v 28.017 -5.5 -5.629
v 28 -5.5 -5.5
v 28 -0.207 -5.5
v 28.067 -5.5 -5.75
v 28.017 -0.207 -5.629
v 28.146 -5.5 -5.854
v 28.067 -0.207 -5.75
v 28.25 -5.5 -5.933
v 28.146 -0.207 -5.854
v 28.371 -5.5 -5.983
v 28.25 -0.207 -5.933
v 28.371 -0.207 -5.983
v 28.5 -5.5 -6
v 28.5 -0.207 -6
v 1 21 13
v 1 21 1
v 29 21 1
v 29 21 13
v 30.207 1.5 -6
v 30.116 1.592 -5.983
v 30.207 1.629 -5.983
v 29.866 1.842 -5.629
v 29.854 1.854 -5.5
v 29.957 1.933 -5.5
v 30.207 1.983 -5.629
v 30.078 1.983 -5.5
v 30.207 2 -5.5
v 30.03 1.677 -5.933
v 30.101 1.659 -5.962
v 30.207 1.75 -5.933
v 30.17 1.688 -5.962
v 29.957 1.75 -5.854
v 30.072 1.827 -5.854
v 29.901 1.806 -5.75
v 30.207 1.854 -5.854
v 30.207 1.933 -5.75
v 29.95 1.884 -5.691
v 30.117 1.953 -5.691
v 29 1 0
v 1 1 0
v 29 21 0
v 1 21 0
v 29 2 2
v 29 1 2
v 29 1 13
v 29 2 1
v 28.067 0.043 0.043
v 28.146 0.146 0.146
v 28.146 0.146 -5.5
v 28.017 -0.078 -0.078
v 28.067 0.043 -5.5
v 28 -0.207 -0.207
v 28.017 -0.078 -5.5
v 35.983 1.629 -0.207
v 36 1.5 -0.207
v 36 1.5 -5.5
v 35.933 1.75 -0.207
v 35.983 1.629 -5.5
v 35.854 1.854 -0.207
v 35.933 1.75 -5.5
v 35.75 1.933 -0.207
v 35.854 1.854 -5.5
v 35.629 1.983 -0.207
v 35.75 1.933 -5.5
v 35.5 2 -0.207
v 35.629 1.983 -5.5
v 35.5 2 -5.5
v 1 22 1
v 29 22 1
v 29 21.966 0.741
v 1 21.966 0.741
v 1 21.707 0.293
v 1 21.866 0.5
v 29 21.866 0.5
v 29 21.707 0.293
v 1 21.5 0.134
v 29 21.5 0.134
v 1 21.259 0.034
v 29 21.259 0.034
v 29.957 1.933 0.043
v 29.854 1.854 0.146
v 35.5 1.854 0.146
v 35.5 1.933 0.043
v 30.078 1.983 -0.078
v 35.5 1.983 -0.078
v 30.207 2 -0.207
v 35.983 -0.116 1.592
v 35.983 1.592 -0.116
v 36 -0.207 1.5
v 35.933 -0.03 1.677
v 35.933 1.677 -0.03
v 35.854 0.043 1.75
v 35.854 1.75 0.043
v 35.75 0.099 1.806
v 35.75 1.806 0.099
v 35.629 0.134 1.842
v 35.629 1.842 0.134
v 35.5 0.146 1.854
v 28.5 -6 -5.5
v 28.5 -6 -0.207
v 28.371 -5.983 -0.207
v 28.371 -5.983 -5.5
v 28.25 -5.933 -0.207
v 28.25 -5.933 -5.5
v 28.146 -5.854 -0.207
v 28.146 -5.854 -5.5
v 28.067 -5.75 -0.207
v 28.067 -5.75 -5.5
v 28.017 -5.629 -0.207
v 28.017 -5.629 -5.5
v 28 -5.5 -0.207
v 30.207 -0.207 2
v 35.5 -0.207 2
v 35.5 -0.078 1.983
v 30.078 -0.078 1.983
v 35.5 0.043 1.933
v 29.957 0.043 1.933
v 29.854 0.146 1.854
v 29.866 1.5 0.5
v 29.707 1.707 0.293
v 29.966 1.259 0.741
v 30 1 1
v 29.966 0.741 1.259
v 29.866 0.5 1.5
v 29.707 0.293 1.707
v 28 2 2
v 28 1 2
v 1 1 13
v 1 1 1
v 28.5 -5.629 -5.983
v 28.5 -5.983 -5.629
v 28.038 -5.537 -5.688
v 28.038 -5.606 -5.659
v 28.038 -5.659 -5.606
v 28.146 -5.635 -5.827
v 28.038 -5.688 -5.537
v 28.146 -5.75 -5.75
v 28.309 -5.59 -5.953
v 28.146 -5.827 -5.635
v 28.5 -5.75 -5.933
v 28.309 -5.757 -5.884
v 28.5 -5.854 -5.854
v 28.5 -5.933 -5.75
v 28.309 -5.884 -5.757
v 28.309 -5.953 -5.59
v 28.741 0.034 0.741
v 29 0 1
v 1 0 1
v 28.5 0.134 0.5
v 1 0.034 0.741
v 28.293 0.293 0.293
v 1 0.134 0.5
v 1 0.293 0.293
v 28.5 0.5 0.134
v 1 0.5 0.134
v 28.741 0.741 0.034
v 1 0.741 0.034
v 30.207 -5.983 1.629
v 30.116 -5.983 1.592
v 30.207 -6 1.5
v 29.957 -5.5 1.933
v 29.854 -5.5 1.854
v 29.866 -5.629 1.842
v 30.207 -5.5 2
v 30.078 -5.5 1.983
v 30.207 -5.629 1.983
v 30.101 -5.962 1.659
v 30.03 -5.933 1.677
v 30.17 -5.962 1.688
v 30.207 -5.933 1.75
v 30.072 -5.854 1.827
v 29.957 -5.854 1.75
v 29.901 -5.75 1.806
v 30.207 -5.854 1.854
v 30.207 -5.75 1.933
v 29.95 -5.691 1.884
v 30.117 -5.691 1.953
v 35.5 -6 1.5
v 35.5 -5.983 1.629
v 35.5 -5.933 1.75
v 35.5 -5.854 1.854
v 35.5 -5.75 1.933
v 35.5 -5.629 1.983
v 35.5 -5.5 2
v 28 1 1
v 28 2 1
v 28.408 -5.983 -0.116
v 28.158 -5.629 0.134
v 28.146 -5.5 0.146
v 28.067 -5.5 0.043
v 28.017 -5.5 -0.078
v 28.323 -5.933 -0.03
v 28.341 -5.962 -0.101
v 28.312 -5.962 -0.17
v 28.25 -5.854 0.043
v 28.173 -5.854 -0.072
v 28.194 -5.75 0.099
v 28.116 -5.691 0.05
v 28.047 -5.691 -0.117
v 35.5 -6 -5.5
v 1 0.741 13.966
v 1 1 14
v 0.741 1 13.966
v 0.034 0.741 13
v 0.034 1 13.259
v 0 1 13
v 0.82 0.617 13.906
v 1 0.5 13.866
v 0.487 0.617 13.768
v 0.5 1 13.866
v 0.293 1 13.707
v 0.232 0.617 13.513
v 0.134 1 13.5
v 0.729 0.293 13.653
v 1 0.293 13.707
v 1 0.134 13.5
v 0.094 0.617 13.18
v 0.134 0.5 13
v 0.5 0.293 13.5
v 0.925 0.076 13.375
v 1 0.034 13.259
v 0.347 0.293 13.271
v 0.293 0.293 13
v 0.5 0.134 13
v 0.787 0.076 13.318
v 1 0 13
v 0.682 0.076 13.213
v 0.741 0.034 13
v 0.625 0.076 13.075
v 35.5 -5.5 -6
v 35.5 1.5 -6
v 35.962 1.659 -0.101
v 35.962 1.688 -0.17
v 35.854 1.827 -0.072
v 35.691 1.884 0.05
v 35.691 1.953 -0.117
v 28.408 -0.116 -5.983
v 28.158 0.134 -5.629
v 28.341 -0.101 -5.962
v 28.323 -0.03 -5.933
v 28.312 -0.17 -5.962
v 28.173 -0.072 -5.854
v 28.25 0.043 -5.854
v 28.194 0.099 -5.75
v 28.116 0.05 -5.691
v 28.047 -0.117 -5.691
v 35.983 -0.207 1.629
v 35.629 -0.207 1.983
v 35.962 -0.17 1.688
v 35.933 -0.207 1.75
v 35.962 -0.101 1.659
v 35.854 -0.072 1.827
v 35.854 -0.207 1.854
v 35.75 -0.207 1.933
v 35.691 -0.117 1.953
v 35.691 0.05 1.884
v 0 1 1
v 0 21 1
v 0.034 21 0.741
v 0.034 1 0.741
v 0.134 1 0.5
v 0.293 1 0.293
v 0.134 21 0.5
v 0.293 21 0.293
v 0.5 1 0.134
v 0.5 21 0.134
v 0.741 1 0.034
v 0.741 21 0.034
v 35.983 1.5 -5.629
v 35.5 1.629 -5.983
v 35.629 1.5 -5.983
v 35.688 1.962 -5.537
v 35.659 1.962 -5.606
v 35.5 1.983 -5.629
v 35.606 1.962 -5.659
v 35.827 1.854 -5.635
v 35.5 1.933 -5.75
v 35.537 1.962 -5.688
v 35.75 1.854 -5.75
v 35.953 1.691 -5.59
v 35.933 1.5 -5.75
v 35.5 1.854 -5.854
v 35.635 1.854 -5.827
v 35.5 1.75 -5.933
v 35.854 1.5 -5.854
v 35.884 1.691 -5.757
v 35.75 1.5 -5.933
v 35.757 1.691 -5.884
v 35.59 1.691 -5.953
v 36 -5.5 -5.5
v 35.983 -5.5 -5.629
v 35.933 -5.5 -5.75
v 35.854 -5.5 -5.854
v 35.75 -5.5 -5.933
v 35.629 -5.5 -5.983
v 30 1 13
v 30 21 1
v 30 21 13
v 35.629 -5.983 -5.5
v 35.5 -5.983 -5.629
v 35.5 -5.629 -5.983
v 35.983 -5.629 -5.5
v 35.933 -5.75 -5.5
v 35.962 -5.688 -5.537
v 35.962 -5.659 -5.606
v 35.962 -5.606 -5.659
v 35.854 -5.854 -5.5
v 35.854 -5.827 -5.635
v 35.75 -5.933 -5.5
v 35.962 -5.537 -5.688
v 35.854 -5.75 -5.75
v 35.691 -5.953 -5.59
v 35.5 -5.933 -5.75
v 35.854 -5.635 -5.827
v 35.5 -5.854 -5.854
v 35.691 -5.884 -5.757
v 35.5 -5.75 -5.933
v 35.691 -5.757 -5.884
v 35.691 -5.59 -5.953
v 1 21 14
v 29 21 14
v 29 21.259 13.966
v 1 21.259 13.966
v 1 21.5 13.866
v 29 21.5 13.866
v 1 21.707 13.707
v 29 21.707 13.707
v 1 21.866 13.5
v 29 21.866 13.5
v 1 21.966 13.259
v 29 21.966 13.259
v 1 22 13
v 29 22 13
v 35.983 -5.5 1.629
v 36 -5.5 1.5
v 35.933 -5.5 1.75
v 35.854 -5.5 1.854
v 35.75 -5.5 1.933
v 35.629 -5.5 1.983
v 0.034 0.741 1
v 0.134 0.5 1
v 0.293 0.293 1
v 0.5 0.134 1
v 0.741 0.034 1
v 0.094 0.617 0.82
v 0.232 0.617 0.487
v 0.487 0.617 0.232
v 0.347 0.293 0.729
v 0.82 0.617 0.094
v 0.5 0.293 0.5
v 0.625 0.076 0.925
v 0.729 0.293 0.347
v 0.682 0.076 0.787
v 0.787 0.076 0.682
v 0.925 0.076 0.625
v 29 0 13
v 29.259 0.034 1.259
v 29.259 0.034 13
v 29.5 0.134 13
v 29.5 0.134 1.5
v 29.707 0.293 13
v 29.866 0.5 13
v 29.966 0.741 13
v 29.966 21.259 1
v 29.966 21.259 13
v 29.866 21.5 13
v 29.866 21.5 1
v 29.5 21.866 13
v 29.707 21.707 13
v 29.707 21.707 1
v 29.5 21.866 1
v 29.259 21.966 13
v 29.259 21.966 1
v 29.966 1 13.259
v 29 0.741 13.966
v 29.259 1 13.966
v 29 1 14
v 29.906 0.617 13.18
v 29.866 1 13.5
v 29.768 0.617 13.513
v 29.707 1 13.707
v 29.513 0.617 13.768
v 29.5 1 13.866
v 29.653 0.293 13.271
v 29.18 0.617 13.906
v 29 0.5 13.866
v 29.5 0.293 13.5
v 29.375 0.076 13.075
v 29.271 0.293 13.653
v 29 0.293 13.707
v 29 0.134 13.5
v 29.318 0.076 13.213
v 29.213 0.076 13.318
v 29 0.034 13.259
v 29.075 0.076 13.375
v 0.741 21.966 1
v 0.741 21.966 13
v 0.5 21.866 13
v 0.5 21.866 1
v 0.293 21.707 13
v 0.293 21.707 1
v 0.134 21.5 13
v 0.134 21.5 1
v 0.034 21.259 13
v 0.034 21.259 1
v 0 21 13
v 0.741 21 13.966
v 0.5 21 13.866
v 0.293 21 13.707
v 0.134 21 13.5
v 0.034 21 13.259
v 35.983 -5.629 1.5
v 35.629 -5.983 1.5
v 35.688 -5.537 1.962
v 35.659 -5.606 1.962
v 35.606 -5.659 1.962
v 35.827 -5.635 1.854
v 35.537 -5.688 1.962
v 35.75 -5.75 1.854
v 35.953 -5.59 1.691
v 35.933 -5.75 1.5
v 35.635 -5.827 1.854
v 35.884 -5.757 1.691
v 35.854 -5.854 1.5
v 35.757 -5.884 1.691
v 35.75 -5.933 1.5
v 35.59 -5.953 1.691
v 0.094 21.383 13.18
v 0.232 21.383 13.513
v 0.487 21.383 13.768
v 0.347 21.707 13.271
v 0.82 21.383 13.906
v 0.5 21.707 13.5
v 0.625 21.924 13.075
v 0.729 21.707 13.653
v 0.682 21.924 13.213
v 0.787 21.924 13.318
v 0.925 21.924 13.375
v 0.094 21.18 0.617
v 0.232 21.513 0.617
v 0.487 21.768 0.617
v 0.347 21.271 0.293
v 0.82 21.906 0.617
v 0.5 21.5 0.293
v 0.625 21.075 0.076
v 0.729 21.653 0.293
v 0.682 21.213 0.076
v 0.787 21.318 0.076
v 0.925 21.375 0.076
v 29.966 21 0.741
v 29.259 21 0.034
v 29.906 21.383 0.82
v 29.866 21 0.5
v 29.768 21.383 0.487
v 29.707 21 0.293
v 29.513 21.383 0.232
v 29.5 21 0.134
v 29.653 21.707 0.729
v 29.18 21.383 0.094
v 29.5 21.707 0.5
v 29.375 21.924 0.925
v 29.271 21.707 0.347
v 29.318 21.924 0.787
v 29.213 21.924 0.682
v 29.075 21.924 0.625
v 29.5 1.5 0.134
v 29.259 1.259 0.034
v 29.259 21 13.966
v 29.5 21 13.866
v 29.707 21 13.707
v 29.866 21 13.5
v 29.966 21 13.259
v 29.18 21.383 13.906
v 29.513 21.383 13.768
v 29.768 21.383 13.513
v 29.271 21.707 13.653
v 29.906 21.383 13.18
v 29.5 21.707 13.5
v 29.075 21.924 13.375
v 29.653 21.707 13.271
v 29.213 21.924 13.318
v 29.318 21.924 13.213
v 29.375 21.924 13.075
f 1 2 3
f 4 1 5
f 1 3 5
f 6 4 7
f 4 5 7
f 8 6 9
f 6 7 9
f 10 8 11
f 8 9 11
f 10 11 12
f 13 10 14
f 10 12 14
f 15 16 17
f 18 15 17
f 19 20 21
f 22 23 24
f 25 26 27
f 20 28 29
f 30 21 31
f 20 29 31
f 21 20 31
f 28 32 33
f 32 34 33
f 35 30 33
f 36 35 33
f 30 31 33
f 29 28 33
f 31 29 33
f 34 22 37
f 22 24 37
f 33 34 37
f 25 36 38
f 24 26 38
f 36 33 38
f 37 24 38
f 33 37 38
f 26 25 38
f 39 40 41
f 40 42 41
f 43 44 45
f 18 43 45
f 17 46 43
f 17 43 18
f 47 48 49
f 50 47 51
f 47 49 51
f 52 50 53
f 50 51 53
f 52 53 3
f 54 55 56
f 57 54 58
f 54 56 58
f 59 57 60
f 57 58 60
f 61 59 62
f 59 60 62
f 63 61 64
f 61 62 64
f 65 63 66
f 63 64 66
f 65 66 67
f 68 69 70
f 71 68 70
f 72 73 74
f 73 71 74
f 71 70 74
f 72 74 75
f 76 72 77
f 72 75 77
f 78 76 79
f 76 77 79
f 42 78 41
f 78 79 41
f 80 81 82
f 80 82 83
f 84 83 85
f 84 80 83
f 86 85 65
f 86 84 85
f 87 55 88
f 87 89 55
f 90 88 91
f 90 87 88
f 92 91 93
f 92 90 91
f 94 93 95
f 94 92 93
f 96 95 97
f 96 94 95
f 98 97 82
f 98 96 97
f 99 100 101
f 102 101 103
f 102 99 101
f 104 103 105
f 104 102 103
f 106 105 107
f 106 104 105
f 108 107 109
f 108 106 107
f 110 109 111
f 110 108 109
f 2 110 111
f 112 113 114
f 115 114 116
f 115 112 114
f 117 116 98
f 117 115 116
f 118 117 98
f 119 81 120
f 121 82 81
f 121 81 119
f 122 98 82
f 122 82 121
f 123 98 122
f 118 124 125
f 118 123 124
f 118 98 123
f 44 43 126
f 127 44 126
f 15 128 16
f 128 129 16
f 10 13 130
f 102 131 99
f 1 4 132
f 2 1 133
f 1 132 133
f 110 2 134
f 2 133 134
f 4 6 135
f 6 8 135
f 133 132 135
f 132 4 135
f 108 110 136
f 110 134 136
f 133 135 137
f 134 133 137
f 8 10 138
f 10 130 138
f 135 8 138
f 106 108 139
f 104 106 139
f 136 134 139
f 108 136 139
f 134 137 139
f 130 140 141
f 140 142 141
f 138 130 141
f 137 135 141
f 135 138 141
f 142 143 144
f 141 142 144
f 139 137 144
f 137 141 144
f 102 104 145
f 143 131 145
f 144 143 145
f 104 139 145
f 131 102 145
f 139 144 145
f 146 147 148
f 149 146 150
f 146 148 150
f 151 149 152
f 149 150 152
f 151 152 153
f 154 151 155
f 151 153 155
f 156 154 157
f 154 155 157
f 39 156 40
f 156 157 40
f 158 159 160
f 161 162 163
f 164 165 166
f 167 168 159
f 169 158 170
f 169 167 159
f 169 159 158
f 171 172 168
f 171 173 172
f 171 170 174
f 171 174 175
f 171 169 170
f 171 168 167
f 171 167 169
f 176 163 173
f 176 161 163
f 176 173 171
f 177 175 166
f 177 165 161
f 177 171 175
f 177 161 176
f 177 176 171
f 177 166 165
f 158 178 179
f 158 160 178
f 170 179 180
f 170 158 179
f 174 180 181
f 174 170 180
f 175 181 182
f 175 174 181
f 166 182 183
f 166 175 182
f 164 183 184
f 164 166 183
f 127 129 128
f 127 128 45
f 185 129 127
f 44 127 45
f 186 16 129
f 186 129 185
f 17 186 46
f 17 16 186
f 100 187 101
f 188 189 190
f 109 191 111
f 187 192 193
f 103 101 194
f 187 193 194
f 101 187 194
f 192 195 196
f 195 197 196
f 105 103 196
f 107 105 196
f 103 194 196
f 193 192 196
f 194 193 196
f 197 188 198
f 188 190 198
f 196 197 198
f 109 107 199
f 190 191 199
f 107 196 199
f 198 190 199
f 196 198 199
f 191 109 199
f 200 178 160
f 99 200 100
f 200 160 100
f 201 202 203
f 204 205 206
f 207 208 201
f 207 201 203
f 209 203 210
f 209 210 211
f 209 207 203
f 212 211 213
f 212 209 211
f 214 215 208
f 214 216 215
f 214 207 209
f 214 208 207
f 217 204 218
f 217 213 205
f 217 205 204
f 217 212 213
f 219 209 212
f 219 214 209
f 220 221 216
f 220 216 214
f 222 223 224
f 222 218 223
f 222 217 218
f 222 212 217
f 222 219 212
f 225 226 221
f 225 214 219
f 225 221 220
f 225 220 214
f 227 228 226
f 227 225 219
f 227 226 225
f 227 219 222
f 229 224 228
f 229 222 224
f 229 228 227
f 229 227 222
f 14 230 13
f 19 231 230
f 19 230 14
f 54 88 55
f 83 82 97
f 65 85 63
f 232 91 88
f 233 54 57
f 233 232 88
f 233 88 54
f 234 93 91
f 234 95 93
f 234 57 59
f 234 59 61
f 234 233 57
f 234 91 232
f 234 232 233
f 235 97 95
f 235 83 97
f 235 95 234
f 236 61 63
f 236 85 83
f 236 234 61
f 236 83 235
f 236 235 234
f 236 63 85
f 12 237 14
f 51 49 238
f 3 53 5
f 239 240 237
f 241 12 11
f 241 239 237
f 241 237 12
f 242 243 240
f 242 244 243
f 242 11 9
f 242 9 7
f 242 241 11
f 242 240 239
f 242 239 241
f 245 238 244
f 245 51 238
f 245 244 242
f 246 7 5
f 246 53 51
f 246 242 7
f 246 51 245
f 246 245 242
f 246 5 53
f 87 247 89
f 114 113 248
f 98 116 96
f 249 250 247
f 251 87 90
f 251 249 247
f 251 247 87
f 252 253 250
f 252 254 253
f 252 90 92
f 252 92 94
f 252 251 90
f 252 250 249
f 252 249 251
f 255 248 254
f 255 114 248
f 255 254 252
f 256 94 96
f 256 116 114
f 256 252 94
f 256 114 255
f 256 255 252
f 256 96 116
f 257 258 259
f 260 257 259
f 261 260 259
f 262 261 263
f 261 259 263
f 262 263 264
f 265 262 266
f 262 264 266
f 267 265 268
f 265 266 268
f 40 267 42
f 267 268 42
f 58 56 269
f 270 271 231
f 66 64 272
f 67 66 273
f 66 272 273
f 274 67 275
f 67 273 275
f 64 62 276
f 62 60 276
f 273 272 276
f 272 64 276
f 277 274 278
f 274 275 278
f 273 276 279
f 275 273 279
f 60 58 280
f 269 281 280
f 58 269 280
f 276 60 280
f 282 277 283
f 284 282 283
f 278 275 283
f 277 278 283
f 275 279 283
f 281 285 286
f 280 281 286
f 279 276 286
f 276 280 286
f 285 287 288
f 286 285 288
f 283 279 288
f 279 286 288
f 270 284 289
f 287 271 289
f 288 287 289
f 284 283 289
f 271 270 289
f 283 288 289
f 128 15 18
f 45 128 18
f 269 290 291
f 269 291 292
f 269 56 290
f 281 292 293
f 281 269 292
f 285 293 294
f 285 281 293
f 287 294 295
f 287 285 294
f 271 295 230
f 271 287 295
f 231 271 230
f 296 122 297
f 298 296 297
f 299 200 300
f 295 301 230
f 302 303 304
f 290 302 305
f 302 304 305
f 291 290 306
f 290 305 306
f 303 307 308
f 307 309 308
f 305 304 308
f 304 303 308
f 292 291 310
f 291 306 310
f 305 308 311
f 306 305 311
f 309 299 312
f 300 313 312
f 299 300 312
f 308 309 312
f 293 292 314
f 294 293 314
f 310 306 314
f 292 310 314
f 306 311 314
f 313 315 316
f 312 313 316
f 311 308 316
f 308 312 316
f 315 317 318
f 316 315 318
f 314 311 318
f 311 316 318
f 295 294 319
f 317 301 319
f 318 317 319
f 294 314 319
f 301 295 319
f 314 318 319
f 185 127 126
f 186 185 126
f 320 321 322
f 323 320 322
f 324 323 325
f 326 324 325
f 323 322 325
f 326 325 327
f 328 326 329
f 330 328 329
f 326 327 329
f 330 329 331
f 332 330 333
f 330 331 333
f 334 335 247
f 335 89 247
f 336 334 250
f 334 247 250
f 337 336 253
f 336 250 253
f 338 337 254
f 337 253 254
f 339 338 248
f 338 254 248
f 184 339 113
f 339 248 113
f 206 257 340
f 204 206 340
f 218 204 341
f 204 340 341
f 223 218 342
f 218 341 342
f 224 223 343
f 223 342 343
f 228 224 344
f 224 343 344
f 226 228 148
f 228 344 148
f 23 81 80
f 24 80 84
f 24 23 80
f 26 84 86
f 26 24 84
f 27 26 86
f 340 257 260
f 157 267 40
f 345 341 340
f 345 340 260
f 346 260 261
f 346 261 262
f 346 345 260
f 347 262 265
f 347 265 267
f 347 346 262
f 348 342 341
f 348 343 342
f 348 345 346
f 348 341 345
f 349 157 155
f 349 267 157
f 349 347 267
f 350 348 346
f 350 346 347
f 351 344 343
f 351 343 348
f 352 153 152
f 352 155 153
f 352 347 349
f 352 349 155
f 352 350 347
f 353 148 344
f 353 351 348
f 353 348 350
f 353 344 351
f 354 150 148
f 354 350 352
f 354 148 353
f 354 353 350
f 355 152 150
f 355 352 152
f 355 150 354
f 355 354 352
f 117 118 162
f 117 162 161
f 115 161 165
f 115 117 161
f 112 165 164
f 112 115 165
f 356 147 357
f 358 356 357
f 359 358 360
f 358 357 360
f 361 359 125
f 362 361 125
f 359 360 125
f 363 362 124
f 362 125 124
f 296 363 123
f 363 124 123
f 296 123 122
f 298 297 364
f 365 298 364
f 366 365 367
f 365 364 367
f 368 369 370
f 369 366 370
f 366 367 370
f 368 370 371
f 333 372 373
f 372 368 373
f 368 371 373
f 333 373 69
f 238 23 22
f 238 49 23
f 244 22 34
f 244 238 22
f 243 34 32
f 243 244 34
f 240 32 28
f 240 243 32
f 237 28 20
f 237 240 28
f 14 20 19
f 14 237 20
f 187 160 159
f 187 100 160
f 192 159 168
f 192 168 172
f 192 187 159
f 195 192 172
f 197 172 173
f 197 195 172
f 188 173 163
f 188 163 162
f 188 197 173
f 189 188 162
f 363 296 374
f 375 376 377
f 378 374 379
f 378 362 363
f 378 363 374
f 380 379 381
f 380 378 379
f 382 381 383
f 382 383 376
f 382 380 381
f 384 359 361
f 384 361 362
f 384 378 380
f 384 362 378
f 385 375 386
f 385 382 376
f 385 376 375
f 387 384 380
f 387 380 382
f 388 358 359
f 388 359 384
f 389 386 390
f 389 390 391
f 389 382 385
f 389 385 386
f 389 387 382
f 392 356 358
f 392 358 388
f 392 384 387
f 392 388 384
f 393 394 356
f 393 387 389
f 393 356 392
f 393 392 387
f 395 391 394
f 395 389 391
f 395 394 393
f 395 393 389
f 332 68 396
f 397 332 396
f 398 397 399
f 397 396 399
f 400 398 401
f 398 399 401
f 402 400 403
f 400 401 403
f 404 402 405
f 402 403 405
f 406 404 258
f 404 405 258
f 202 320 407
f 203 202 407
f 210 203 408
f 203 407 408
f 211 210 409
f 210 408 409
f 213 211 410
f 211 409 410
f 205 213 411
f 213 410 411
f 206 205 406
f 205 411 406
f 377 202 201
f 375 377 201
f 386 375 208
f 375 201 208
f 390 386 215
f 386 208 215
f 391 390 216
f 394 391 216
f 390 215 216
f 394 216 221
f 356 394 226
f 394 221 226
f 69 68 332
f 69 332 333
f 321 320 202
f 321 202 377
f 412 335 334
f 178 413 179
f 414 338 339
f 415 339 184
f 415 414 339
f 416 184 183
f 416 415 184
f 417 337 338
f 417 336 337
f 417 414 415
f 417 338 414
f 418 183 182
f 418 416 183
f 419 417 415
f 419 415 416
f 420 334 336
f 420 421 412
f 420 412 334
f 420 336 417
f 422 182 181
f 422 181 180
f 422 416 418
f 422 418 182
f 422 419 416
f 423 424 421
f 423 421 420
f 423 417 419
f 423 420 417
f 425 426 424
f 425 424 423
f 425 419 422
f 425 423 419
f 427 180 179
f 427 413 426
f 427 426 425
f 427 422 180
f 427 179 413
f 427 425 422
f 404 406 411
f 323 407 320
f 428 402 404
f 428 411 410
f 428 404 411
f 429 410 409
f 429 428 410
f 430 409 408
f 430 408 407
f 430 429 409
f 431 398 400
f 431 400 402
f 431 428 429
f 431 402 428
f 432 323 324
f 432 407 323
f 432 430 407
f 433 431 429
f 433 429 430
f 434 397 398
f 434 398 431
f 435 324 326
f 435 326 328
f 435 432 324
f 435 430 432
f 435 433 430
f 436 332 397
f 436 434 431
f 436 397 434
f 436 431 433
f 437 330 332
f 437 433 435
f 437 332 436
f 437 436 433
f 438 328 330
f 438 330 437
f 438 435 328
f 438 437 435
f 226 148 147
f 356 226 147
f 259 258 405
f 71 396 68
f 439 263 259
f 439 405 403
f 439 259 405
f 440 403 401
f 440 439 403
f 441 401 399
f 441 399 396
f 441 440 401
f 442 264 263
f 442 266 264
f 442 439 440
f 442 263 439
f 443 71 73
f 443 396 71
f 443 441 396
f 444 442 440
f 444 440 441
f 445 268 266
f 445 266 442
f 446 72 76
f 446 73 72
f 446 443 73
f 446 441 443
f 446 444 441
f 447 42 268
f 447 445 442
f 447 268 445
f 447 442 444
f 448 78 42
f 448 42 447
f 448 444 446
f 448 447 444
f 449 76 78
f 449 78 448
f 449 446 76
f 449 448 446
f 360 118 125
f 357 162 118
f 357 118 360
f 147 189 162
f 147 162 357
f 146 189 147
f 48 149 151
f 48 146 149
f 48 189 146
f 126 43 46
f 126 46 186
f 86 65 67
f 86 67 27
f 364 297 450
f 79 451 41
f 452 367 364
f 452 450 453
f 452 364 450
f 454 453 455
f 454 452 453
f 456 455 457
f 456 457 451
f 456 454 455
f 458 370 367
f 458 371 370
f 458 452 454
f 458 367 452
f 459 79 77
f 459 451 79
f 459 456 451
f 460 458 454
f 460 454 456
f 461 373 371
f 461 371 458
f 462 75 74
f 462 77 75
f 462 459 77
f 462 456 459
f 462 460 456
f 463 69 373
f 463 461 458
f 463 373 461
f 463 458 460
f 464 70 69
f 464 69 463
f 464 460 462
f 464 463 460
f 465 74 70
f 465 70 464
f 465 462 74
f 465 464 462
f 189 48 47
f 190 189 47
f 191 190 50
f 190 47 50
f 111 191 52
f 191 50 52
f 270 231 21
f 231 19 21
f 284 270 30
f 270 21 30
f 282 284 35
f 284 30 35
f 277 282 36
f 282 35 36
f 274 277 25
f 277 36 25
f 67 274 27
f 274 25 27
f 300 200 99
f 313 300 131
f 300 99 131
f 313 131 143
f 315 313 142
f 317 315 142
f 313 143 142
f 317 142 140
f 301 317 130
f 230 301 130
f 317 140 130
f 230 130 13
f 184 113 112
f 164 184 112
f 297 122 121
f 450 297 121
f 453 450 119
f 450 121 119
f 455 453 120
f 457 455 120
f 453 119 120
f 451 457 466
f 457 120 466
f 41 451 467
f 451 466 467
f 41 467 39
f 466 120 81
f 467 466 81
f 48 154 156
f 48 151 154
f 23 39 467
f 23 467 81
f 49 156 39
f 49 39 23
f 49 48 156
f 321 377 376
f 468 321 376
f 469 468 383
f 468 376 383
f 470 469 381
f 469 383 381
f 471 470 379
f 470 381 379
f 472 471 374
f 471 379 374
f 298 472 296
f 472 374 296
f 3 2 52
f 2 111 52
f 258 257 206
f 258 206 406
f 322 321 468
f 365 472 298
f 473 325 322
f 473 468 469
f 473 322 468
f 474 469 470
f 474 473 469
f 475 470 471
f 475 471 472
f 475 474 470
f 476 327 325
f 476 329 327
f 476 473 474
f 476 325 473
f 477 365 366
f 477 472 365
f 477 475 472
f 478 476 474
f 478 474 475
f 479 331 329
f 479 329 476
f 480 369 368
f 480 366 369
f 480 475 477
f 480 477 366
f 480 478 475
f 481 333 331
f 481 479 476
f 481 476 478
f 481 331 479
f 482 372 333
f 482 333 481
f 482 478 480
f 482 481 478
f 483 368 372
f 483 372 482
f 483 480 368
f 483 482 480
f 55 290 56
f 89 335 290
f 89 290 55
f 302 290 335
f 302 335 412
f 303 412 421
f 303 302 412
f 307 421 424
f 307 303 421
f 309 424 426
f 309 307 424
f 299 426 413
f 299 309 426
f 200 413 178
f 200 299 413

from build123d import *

# Parameters (mm, degrees)
SKETCH1_W                = 30
SKETCH1_H                = 22
BOSS_EXTRUDE1_DEPTH      = 14
SHELL1_T                 = 1
BOSS_EXTRUDE3_DEPTH      = 6
BOSS_EXTRUDE3_DEPTH_BACK = 2
SKETCH2_W                = 8
SKETCH2_H                = 8
CHAMFER2_SIZE            = 2
FILLET1_R                = 1
FILLET2_R                = 0.5


with BuildPart() as part:
    # Sketch1 → Boss-Extrude1 (new body)
    with BuildSketch(Plane.XY):
        with Locations((15, 11)):
            Rectangle(SKETCH1_W, SKETCH1_H)
    extrude(amount=BOSS_EXTRUDE1_DEPTH)

    # Shell1 (no face opened: a closed hollow body)
    add(offset(amount=-SHELL1_T, mode=Mode.PRIVATE), mode=Mode.SUBTRACT)

    # Sketch2 → Boss-Extrude3 (add, two sides: drawn at the far end of the back side and taken through both)
    with BuildSketch(Plane(origin=(0, 0, 0), x_dir=(-1, 0, 0), z_dir=(0, 0, -1)).offset(-BOSS_EXTRUDE3_DEPTH_BACK)):
        with Locations((-32, -2)):
            Rectangle(SKETCH2_W, SKETCH2_H)
    extrude(amount=BOSS_EXTRUDE3_DEPTH + BOSS_EXTRUDE3_DEPTH_BACK)

    # Chamfer2
    chamfer2_edges = [part.edges().sort_by_distance(p)[0] for p in [
        (28, -3, 2),
        (28, 2, -3),
        (33, 2, 2),
    ]]
    chamfer(chamfer2_edges, length=CHAMFER2_SIZE)

    # Fillet1
    # the kernel refuses this fillet: 1 mm, written as the material it takes off along each edge
    with BuildSketch(Plane(origin=(1, 21, 1), x_dir=(0, 1, 0), z_dir=(0, 0, -1))) as fillet1_piece_1_section:
        Polygon((0, 0), (FILLET1_R, 0), (FILLET1_R, -FILLET1_R), (0, -FILLET1_R), align=None)
    fillet1_piece_1 = extrude(amount=FILLET1_R, mode=Mode.PRIVATE)
    fillet1_piece_1 = fillet1_piece_1 - Plane(origin=(1, 21, 1), x_dir=(0.7071067811865475, -0.7071067811865477, 0), z_dir=(0, 0, -1)) * Sphere(FILLET1_R, mode=Mode.PRIVATE)
    add(fillet1_piece_1, mode=Mode.SUBTRACT)
    with BuildSketch(Plane(origin=(1, 1, 1), x_dir=(0, 0, -1), z_dir=(0, -1, 0))) as fillet1_piece_2_section:
        Polygon((0, 0), (FILLET1_R, 0), (FILLET1_R, -FILLET1_R), (0, -FILLET1_R), align=None)
    fillet1_piece_2 = extrude(amount=FILLET1_R, mode=Mode.PRIVATE)
    fillet1_piece_2 = fillet1_piece_2 - Plane(origin=(1, 1, 1), x_dir=(0.7071067811865475, 0, 0.7071067811865475), z_dir=(0, -1, 0)) * Sphere(FILLET1_R, mode=Mode.PRIVATE)
    add(fillet1_piece_2, mode=Mode.SUBTRACT)
    with BuildSketch(Plane(origin=(29, 21, 1), x_dir=(0, 0, -1), z_dir=(0, 1, 0))) as fillet1_piece_3_section:
        Polygon((0, 0), (FILLET1_R, 0), (FILLET1_R, -FILLET1_R), (0, -FILLET1_R), align=None)
    fillet1_piece_3 = extrude(amount=FILLET1_R, mode=Mode.PRIVATE)
    fillet1_piece_3 = fillet1_piece_3 - Plane(origin=(29, 21, 1), x_dir=(-0.7071067811865475, 0, 0.7071067811865475), z_dir=(0, 1, 0)) * Sphere(FILLET1_R, mode=Mode.PRIVATE)
    add(fillet1_piece_3, mode=Mode.SUBTRACT)
    with BuildSketch(Plane(origin=(1, 1, 13), x_dir=(-1, 0, 0), z_dir=(0, -1, 0))) as fillet1_piece_4_section:
        Polygon((0, 0), (FILLET1_R, 0), (FILLET1_R, -FILLET1_R), (0, -FILLET1_R), align=None)
    fillet1_piece_4 = extrude(amount=FILLET1_R, mode=Mode.PRIVATE)
    fillet1_piece_4 = fillet1_piece_4 - Plane(origin=(1, 1, 13), x_dir=(0.7071067811865475, 0, -0.7071067811865475), z_dir=(0, -1, 0)) * Sphere(FILLET1_R, mode=Mode.PRIVATE)
    add(fillet1_piece_4, mode=Mode.SUBTRACT)
    with BuildSketch(Plane(origin=(29, 1, 13), x_dir=(1, 0, 0), z_dir=(0, -1, 0))) as fillet1_piece_5_section:
        Polygon((0, 0), (FILLET1_R, 0), (FILLET1_R, FILLET1_R), (0, FILLET1_R), align=None)
    fillet1_piece_5 = extrude(amount=FILLET1_R, mode=Mode.PRIVATE)
    fillet1_piece_5 = fillet1_piece_5 - Plane(origin=(29, 1, 13), x_dir=(-0.7071067811865475, 0, -0.7071067811865475), z_dir=(0, -1, 0)) * Sphere(FILLET1_R, mode=Mode.PRIVATE)
    add(fillet1_piece_5, mode=Mode.SUBTRACT)
    with BuildSketch(Plane(origin=(29, 21, 13), x_dir=(1, 0, 0), z_dir=(0, 1, 0))) as fillet1_piece_6_section:
        Polygon((0, 0), (FILLET1_R, 0), (FILLET1_R, -FILLET1_R), (0, -FILLET1_R), align=None)
    fillet1_piece_6 = extrude(amount=FILLET1_R, mode=Mode.PRIVATE)
    fillet1_piece_6 = fillet1_piece_6 - Plane(origin=(29, 21, 13), x_dir=(-0.7071067811865475, 0, -0.7071067811865475), z_dir=(0, 1, 0)) * Sphere(FILLET1_R, mode=Mode.PRIVATE)
    add(fillet1_piece_6, mode=Mode.SUBTRACT)
    with BuildSketch(Plane(origin=(1, 21, 13), x_dir=(-1, 0, 0), z_dir=(0, 1, 0))) as fillet1_piece_7_section:
        Polygon((0, 0), (FILLET1_R, 0), (FILLET1_R, FILLET1_R), (0, FILLET1_R), align=None)
    fillet1_piece_7 = extrude(amount=FILLET1_R, mode=Mode.PRIVATE)
    fillet1_piece_7 = fillet1_piece_7 - Plane(origin=(1, 21, 13), x_dir=(0.7071067811865475, 0, -0.7071067811865475), z_dir=(0, 1, 0)) * Sphere(FILLET1_R, mode=Mode.PRIVATE)
    add(fillet1_piece_7, mode=Mode.SUBTRACT)
    with BuildSketch(Plane(origin=(0, 21, 0), x_dir=(1, 0, 0), z_dir=(0, -1, 0)), Plane(origin=(30, 1, 14), x_dir=(0, 0, -1), z_dir=(0, 1, 0)), Plane(origin=(0, 21, 14), x_dir=(0, 0, -1), z_dir=(0, -1, 0))) as fillet1_piece_8:
        with BuildLine():
            CenterArc((FILLET1_R, FILLET1_R), FILLET1_R, 180, 90)
            Line((0, FILLET1_R), (0, 0))
            Line((0, 0), (FILLET1_R, 0))
        make_face()
    extrude(amount=20, mode=Mode.SUBTRACT)
    with BuildSketch(Plane(origin=(1, 0, 0), x_dir=(0, 0, 1), z_dir=(1, 0, 0))) as fillet1_piece_9_section:
        with BuildLine():
            CenterArc((FILLET1_R, -FILLET1_R), FILLET1_R, 90, 90)
            Line((0, -FILLET1_R), (0, 0))
            Line((0, 0), (FILLET1_R, 0))
        make_face()
    fillet1_piece_9 = extrude(amount=29.5, mode=Mode.PRIVATE)
    fillet1_piece_9 = split(fillet1_piece_9, bisect_by=Plane(origin=(21.381816869, 0.226411675, -6.618183131), z_dir=(-0.7071067811865476, 0, 0.7071067811865476)), keep=Keep.TOP, mode=Mode.PRIVATE)
    fillet1_piece_9 = split(fillet1_piece_9, bisect_by=Plane(origin=(21.381816869, -6.618183131, 0.226411675), z_dir=(-0.7071067811865476, 0.7071067811865476, 0)), keep=Keep.TOP, mode=Mode.PRIVATE)
    add(fillet1_piece_9, mode=Mode.SUBTRACT)
    with BuildSketch(Plane(origin=(1, 0, 0), x_dir=(0, 0, 1), z_dir=(1, 0, 0))) as fillet1_piece_10_section:
        with BuildLine():
            CenterArc((FILLET1_R, -FILLET1_R), FILLET1_R, 90, 90)
            Line((0, -FILLET1_R), (0, 0))
            Line((0, 0), (FILLET1_R, 0))
        make_face()
    fillet1_piece_10 = extrude(amount=29.5, mode=Mode.PRIVATE)
    fillet1_piece_10 = split(fillet1_piece_10, bisect_by=Plane(origin=(28.16446835, 0.528927527, 0.16446835), z_dir=(0.7071067811865476, 0, -0.7071067811865476)), keep=Keep.TOP, mode=Mode.PRIVATE)
    fillet1_piece_10 = split(fillet1_piece_10, bisect_by=Plane(origin=(28.407441135, 0.407441135, 0.042981958), z_dir=(-0.7071067811865476, 0.7071067811865476, 0)), keep=Keep.TOP, mode=Mode.PRIVATE)
    add(fillet1_piece_10, mode=Mode.SUBTRACT)
    with BuildSketch(Plane(origin=(1, 0, 0), x_dir=(0, 0, 1), z_dir=(1, 0, 0))) as fillet1_piece_11_section:
        with BuildLine():
            CenterArc((FILLET1_R, -FILLET1_R), FILLET1_R, 90, 90)
            Line((0, -FILLET1_R), (0, 0))
            Line((0, 0), (FILLET1_R, 0))
        make_face()
    fillet1_piece_11 = extrude(amount=29.5, mode=Mode.PRIVATE)
    fillet1_piece_11 = split(fillet1_piece_11, bisect_by=Plane(origin=(28.407441135, 0.042981958, 0.407441135), z_dir=(-0.7071067811865476, 0, 0.7071067811865476)), keep=Keep.TOP, mode=Mode.PRIVATE)
    fillet1_piece_11 = split(fillet1_piece_11, bisect_by=Plane(origin=(28.16446835, 0.16446835, 0.528927527), z_dir=(0.7071067811865476, -0.7071067811865476, 0)), keep=Keep.TOP, mode=Mode.PRIVATE)
    add(fillet1_piece_11, mode=Mode.SUBTRACT)
    with BuildSketch(Plane(origin=(30, -0.5, 0), x_dir=(-1, 0, 0), z_dir=(0, 1, 0))) as fillet1_piece_12_section:
        with BuildLine():
            CenterArc((FILLET1_R, FILLET1_R), FILLET1_R, 180, 90)
            Line((0, FILLET1_R), (0, 0))
            Line((0, 0), (FILLET1_R, 0))
        make_face()
    fillet1_piece_12 = extrude(amount=21.5, mode=Mode.PRIVATE)
    fillet1_piece_12 = split(fillet1_piece_12, bisect_by=Plane(origin=(29.83553165, 1.83553165, 0.528927527), z_dir=(0.7071067811865476, -0.7071067811865476, 0)), keep=Keep.TOP, mode=Mode.PRIVATE)
    fillet1_piece_12 = split(fillet1_piece_12, bisect_by=Plane(origin=(29.957018042, 1.592558865, 0.407441135), z_dir=(0, 0.7071067811865476, 0.7071067811865476)), keep=Keep.TOP, mode=Mode.PRIVATE)
    add(fillet1_piece_12, mode=Mode.SUBTRACT)
    with BuildSketch(Plane(origin=(30, -0.5, 0), x_dir=(-1, 0, 0), z_dir=(0, 1, 0))) as fillet1_piece_13_section:
        with BuildLine():
            CenterArc((FILLET1_R, FILLET1_R), FILLET1_R, 180, 90)
            Line((0, FILLET1_R), (0, 0))
            Line((0, 0), (FILLET1_R, 0))
        make_face()
    fillet1_piece_13 = extrude(amount=21.5, mode=Mode.PRIVATE)
    fillet1_piece_13 = split(fillet1_piece_13, bisect_by=Plane(origin=(29.592558865, 1.592558865, 0.042981958), z_dir=(-0.7071067811865476, 0.7071067811865476, 0)), keep=Keep.TOP, mode=Mode.PRIVATE)
    fillet1_piece_13 = split(fillet1_piece_13, bisect_by=Plane(origin=(29.471072473, 1.83553165, 0.16446835), z_dir=(0, -0.7071067811865476, -0.7071067811865476)), keep=Keep.TOP, mode=Mode.PRIVATE)
    add(fillet1_piece_13, mode=Mode.SUBTRACT)
    with BuildSketch(Plane(origin=(30, -0.5, 0), x_dir=(-1, 0, 0), z_dir=(0, 1, 0))) as fillet1_piece_14_section:
        with BuildLine():
            CenterArc((FILLET1_R, FILLET1_R), FILLET1_R, 180, 90)
            Line((0, FILLET1_R), (0, 0))
            Line((0, 0), (FILLET1_R, 0))
        make_face()
    fillet1_piece_14 = extrude(amount=21.5, mode=Mode.PRIVATE)
    fillet1_piece_14 = split(fillet1_piece_14, bisect_by=Plane(origin=(34.618159496, 6.618159496, 0.226418621), z_dir=(-0.7071067811865476, 0.7071067811865476, 0)), keep=Keep.TOP, mode=Mode.PRIVATE)
    fillet1_piece_14 = split(fillet1_piece_14, bisect_by=Plane(origin=(29.773581379, 6.618159496, -4.618159496), z_dir=(0, 0.7071067811865476, 0.7071067811865476)), keep=Keep.TOP, mode=Mode.PRIVATE)
    add(fillet1_piece_14, mode=Mode.SUBTRACT)
    with BuildSketch(Plane(origin=(29, 22, 0), x_dir=(0, -1, 0), z_dir=(-1, 0, 0)), Plane(origin=(1, 0, 14), x_dir=(0, 0, -1), z_dir=(1, 0, 0))) as fillet1_piece_15:
        with BuildLine():
            CenterArc((FILLET1_R, FILLET1_R), FILLET1_R, 180, 90)
            Line((0, FILLET1_R), (0, 0))
            Line((0, 0), (FILLET1_R, 0))
        make_face()
    extrude(amount=28, mode=Mode.SUBTRACT)
    with BuildSketch(Plane(origin=(29, 22, 14), x_dir=(0, -1, 0), z_dir=(-1, 0, 0))) as fillet1_piece_16:
        with BuildLine():
            CenterArc((FILLET1_R, -FILLET1_R), FILLET1_R, 90, 90)
            Line((0, -FILLET1_R), (0, 0))
            Line((0, 0), (FILLET1_R, 0))
        make_face()
    extrude(amount=28, mode=Mode.SUBTRACT)
    with BuildSketch(Plane(origin=(0, 22, 1), x_dir=(0, -1, 0), z_dir=(0, 0, 1)), Plane(origin=(0, 0, 1), x_dir=(1, 0, 0), z_dir=(0, 0, 1))) as fillet1_piece_17:
        with BuildLine():
            CenterArc((FILLET1_R, FILLET1_R), FILLET1_R, 180, 90)
            Line((0, FILLET1_R), (0, 0))
            Line((0, 0), (FILLET1_R, 0))
        make_face()
    extrude(amount=12, mode=Mode.SUBTRACT)
    with BuildSketch(Plane(origin=(30, 22, 1), x_dir=(0, -1, 0), z_dir=(0, 0, 1))) as fillet1_piece_18:
        with BuildLine():
            CenterArc((FILLET1_R, -FILLET1_R), FILLET1_R, 90, 90)
            Line((0, -FILLET1_R), (0, 0))
            Line((0, 0), (FILLET1_R, 0))
        make_face()
    extrude(amount=12, mode=Mode.SUBTRACT)
    with BuildSketch(Plane(origin=(30, 0, -0.5), x_dir=(-1, 0, 0), z_dir=(0, 0, 1))) as fillet1_piece_19_section:
        with BuildLine():
            CenterArc((FILLET1_R, -FILLET1_R), FILLET1_R, 90, 90)
            Line((0, -FILLET1_R), (0, 0))
            Line((0, 0), (FILLET1_R, 0))
        make_face()
    fillet1_piece_19 = extrude(amount=13.5, mode=Mode.PRIVATE)
    fillet1_piece_19 = split(fillet1_piece_19, bisect_by=Plane(origin=(29.83553165, 0.528927527, 1.83553165), z_dir=(0.7071067811865476, 0, -0.7071067811865476)), keep=Keep.TOP, mode=Mode.PRIVATE)
    fillet1_piece_19 = split(fillet1_piece_19, bisect_by=Plane(origin=(29.957018042, 0.407441135, 1.592558865), z_dir=(0, 0.7071067811865476, 0.7071067811865476)), keep=Keep.TOP, mode=Mode.PRIVATE)
    add(fillet1_piece_19, mode=Mode.SUBTRACT)
    with BuildSketch(Plane(origin=(30, 0, -0.5), x_dir=(-1, 0, 0), z_dir=(0, 0, 1))) as fillet1_piece_20_section:
        with BuildLine():
            CenterArc((FILLET1_R, -FILLET1_R), FILLET1_R, 90, 90)
            Line((0, -FILLET1_R), (0, 0))
            Line((0, 0), (FILLET1_R, 0))
        make_face()
    fillet1_piece_20 = extrude(amount=13.5, mode=Mode.PRIVATE)
    fillet1_piece_20 = split(fillet1_piece_20, bisect_by=Plane(origin=(29.592558865, 0.042981958, 1.592558865), z_dir=(-0.7071067811865476, 0, 0.7071067811865476)), keep=Keep.TOP, mode=Mode.PRIVATE)
    fillet1_piece_20 = split(fillet1_piece_20, bisect_by=Plane(origin=(29.471072473, 0.16446835, 1.83553165), z_dir=(0, -0.7071067811865476, -0.7071067811865476)), keep=Keep.TOP, mode=Mode.PRIVATE)
    add(fillet1_piece_20, mode=Mode.SUBTRACT)
    with BuildSketch(Plane(origin=(30, 0, -0.5), x_dir=(-1, 0, 0), z_dir=(0, 0, 1))) as fillet1_piece_21_section:
        with BuildLine():
            CenterArc((FILLET1_R, -FILLET1_R), FILLET1_R, 90, 90)
            Line((0, -FILLET1_R), (0, 0))
            Line((0, 0), (FILLET1_R, 0))
        make_face()
    fillet1_piece_21 = extrude(amount=13.5, mode=Mode.PRIVATE)
    fillet1_piece_21 = split(fillet1_piece_21, bisect_by=Plane(origin=(32.618101716, 0.226435602, 4.618101716), z_dir=(-0.7071067811865476, 0, 0.7071067811865476)), keep=Keep.TOP, mode=Mode.PRIVATE)
    fillet1_piece_21 = split(fillet1_piece_21, bisect_by=Plane(origin=(29.773564398, -2.618101716, 4.618101716), z_dir=(0, 0.7071067811865476, 0.7071067811865476)), keep=Keep.TOP, mode=Mode.PRIVATE)
    add(fillet1_piece_21, mode=Mode.SUBTRACT)

    # Fillet2
    fillet2_edges = [part.edges().sort_by_distance(p)[0] for p in [
        (32, -6, -6),
        (36, -6, -2),
        (36, -2, -6),
        (36, 2, -3),
        (33, 2, -6),
        (30, 2, -3),
        (33, 2, 0),
        (36, -3, 2),
        (36, 1, 1),
        (33, -6, 2),
        (30, -3, 2),
        (33, 0, 2),
        (28, -3, -6),
        (28, -6, -3),
        (28, -3, 0),
        (28, 0, -3),
        (29, 1, -6),
        (29, -6, 1),
    ]]
    fillet(fillet2_edges, radius=FILLET2_R)


solid = part.part
